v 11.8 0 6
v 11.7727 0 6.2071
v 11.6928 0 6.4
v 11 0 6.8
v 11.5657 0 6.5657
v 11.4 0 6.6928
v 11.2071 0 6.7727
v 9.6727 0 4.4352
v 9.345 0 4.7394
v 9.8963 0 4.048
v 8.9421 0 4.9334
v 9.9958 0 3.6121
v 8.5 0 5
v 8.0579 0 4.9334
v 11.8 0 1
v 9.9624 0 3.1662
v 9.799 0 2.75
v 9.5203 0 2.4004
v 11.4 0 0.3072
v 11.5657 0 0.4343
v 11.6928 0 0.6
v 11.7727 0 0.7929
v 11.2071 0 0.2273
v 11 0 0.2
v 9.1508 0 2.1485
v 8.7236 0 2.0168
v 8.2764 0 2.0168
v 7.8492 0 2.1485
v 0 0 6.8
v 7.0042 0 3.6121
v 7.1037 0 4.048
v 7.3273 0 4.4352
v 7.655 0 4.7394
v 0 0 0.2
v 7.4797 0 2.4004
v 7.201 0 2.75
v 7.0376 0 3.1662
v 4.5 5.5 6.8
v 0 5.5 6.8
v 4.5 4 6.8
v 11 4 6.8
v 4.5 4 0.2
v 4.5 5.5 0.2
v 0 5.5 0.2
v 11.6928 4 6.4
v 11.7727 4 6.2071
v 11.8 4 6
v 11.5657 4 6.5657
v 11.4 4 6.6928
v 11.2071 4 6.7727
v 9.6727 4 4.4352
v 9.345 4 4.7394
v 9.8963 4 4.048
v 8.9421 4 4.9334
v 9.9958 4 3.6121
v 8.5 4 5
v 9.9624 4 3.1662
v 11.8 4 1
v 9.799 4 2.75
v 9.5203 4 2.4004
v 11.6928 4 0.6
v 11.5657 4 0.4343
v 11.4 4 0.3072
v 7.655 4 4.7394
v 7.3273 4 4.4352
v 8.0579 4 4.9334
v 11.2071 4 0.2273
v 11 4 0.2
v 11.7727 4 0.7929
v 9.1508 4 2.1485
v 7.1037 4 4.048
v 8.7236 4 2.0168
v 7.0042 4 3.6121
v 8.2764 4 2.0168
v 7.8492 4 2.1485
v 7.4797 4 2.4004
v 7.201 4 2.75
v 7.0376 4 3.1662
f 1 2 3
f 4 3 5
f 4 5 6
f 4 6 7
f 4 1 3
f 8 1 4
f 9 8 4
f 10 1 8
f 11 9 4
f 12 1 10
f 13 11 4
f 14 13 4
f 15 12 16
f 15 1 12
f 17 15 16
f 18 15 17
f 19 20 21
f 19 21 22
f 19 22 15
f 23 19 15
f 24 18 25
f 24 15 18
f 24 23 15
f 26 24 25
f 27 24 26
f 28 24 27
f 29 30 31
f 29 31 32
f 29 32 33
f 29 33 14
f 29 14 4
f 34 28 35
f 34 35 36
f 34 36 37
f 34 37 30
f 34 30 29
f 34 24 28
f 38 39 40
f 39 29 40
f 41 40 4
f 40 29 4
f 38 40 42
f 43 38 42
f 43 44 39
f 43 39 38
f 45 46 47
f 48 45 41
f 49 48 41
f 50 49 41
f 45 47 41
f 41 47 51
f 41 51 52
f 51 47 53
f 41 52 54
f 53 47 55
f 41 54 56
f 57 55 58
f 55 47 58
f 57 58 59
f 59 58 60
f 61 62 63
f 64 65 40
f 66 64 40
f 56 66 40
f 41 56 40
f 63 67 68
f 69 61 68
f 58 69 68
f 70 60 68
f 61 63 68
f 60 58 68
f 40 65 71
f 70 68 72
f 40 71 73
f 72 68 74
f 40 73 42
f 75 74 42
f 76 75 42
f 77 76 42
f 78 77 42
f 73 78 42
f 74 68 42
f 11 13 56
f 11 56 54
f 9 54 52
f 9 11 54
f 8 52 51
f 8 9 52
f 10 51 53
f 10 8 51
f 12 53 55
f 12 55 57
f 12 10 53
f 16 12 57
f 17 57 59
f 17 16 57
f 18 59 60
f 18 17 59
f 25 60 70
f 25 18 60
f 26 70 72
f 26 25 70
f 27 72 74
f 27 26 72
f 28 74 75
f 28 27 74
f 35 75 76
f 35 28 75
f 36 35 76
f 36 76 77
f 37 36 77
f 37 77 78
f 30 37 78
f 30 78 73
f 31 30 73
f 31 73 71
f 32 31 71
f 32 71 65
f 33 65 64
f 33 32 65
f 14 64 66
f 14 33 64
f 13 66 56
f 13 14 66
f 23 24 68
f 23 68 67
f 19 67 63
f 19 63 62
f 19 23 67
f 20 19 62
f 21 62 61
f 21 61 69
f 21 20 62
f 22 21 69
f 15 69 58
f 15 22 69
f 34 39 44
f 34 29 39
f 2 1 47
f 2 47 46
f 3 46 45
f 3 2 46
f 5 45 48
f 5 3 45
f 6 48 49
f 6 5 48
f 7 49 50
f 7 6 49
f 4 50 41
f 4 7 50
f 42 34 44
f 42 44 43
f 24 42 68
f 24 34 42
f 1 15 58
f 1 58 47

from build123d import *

# Parameters (mm, degrees)
SKETCH1_R           = 1.5
BOSS_EXTRUDE1_DEPTH = 4
SKETCH2_W           = 4.5
SKETCH2_H           = 6.6
BOSS_EXTRUDE2_DEPTH = 1.5


with BuildPart() as part:
    # Sketch1 → Boss-Extrude1 (new body)
    with BuildSketch(Plane(origin=(0, 0, 0), x_dir=(1, 0, 0), z_dir=(0, 1, 0))):
        with BuildLine():
            Line((11.8, -1), (11.8, -6))
            ThreePointArc((11.8, -6), (11.565685425, -6.565685425), (11, -6.8))
            Line((11, -6.8), (0, -6.8))
            Line((0, -6.8), (0, -0.2))
            Line((0, -0.2), (11, -0.2))
            ThreePointArc((11, -0.2), (11.565685425, -0.434314575), (11.8, -1))
        make_face()
        with Locations(Location((8.5, -3.5, 0), (0, 0, 270))):  # turned: the seam where the file's is
            Circle(SKETCH1_R, mode=Mode.SUBTRACT)
    extrude(amount=BOSS_EXTRUDE1_DEPTH)

    # Sketch2 → Boss-Extrude2 (add)
    with BuildSketch(Plane(origin=(0, 4, 0), x_dir=(1, 0, 0), z_dir=(0, 1, 0))):
        with Locations((2.25, -3.5)):
            Rectangle(SKETCH2_W, SKETCH2_H)
    extrude(amount=BOSS_EXTRUDE2_DEPTH)


solid = part.part
